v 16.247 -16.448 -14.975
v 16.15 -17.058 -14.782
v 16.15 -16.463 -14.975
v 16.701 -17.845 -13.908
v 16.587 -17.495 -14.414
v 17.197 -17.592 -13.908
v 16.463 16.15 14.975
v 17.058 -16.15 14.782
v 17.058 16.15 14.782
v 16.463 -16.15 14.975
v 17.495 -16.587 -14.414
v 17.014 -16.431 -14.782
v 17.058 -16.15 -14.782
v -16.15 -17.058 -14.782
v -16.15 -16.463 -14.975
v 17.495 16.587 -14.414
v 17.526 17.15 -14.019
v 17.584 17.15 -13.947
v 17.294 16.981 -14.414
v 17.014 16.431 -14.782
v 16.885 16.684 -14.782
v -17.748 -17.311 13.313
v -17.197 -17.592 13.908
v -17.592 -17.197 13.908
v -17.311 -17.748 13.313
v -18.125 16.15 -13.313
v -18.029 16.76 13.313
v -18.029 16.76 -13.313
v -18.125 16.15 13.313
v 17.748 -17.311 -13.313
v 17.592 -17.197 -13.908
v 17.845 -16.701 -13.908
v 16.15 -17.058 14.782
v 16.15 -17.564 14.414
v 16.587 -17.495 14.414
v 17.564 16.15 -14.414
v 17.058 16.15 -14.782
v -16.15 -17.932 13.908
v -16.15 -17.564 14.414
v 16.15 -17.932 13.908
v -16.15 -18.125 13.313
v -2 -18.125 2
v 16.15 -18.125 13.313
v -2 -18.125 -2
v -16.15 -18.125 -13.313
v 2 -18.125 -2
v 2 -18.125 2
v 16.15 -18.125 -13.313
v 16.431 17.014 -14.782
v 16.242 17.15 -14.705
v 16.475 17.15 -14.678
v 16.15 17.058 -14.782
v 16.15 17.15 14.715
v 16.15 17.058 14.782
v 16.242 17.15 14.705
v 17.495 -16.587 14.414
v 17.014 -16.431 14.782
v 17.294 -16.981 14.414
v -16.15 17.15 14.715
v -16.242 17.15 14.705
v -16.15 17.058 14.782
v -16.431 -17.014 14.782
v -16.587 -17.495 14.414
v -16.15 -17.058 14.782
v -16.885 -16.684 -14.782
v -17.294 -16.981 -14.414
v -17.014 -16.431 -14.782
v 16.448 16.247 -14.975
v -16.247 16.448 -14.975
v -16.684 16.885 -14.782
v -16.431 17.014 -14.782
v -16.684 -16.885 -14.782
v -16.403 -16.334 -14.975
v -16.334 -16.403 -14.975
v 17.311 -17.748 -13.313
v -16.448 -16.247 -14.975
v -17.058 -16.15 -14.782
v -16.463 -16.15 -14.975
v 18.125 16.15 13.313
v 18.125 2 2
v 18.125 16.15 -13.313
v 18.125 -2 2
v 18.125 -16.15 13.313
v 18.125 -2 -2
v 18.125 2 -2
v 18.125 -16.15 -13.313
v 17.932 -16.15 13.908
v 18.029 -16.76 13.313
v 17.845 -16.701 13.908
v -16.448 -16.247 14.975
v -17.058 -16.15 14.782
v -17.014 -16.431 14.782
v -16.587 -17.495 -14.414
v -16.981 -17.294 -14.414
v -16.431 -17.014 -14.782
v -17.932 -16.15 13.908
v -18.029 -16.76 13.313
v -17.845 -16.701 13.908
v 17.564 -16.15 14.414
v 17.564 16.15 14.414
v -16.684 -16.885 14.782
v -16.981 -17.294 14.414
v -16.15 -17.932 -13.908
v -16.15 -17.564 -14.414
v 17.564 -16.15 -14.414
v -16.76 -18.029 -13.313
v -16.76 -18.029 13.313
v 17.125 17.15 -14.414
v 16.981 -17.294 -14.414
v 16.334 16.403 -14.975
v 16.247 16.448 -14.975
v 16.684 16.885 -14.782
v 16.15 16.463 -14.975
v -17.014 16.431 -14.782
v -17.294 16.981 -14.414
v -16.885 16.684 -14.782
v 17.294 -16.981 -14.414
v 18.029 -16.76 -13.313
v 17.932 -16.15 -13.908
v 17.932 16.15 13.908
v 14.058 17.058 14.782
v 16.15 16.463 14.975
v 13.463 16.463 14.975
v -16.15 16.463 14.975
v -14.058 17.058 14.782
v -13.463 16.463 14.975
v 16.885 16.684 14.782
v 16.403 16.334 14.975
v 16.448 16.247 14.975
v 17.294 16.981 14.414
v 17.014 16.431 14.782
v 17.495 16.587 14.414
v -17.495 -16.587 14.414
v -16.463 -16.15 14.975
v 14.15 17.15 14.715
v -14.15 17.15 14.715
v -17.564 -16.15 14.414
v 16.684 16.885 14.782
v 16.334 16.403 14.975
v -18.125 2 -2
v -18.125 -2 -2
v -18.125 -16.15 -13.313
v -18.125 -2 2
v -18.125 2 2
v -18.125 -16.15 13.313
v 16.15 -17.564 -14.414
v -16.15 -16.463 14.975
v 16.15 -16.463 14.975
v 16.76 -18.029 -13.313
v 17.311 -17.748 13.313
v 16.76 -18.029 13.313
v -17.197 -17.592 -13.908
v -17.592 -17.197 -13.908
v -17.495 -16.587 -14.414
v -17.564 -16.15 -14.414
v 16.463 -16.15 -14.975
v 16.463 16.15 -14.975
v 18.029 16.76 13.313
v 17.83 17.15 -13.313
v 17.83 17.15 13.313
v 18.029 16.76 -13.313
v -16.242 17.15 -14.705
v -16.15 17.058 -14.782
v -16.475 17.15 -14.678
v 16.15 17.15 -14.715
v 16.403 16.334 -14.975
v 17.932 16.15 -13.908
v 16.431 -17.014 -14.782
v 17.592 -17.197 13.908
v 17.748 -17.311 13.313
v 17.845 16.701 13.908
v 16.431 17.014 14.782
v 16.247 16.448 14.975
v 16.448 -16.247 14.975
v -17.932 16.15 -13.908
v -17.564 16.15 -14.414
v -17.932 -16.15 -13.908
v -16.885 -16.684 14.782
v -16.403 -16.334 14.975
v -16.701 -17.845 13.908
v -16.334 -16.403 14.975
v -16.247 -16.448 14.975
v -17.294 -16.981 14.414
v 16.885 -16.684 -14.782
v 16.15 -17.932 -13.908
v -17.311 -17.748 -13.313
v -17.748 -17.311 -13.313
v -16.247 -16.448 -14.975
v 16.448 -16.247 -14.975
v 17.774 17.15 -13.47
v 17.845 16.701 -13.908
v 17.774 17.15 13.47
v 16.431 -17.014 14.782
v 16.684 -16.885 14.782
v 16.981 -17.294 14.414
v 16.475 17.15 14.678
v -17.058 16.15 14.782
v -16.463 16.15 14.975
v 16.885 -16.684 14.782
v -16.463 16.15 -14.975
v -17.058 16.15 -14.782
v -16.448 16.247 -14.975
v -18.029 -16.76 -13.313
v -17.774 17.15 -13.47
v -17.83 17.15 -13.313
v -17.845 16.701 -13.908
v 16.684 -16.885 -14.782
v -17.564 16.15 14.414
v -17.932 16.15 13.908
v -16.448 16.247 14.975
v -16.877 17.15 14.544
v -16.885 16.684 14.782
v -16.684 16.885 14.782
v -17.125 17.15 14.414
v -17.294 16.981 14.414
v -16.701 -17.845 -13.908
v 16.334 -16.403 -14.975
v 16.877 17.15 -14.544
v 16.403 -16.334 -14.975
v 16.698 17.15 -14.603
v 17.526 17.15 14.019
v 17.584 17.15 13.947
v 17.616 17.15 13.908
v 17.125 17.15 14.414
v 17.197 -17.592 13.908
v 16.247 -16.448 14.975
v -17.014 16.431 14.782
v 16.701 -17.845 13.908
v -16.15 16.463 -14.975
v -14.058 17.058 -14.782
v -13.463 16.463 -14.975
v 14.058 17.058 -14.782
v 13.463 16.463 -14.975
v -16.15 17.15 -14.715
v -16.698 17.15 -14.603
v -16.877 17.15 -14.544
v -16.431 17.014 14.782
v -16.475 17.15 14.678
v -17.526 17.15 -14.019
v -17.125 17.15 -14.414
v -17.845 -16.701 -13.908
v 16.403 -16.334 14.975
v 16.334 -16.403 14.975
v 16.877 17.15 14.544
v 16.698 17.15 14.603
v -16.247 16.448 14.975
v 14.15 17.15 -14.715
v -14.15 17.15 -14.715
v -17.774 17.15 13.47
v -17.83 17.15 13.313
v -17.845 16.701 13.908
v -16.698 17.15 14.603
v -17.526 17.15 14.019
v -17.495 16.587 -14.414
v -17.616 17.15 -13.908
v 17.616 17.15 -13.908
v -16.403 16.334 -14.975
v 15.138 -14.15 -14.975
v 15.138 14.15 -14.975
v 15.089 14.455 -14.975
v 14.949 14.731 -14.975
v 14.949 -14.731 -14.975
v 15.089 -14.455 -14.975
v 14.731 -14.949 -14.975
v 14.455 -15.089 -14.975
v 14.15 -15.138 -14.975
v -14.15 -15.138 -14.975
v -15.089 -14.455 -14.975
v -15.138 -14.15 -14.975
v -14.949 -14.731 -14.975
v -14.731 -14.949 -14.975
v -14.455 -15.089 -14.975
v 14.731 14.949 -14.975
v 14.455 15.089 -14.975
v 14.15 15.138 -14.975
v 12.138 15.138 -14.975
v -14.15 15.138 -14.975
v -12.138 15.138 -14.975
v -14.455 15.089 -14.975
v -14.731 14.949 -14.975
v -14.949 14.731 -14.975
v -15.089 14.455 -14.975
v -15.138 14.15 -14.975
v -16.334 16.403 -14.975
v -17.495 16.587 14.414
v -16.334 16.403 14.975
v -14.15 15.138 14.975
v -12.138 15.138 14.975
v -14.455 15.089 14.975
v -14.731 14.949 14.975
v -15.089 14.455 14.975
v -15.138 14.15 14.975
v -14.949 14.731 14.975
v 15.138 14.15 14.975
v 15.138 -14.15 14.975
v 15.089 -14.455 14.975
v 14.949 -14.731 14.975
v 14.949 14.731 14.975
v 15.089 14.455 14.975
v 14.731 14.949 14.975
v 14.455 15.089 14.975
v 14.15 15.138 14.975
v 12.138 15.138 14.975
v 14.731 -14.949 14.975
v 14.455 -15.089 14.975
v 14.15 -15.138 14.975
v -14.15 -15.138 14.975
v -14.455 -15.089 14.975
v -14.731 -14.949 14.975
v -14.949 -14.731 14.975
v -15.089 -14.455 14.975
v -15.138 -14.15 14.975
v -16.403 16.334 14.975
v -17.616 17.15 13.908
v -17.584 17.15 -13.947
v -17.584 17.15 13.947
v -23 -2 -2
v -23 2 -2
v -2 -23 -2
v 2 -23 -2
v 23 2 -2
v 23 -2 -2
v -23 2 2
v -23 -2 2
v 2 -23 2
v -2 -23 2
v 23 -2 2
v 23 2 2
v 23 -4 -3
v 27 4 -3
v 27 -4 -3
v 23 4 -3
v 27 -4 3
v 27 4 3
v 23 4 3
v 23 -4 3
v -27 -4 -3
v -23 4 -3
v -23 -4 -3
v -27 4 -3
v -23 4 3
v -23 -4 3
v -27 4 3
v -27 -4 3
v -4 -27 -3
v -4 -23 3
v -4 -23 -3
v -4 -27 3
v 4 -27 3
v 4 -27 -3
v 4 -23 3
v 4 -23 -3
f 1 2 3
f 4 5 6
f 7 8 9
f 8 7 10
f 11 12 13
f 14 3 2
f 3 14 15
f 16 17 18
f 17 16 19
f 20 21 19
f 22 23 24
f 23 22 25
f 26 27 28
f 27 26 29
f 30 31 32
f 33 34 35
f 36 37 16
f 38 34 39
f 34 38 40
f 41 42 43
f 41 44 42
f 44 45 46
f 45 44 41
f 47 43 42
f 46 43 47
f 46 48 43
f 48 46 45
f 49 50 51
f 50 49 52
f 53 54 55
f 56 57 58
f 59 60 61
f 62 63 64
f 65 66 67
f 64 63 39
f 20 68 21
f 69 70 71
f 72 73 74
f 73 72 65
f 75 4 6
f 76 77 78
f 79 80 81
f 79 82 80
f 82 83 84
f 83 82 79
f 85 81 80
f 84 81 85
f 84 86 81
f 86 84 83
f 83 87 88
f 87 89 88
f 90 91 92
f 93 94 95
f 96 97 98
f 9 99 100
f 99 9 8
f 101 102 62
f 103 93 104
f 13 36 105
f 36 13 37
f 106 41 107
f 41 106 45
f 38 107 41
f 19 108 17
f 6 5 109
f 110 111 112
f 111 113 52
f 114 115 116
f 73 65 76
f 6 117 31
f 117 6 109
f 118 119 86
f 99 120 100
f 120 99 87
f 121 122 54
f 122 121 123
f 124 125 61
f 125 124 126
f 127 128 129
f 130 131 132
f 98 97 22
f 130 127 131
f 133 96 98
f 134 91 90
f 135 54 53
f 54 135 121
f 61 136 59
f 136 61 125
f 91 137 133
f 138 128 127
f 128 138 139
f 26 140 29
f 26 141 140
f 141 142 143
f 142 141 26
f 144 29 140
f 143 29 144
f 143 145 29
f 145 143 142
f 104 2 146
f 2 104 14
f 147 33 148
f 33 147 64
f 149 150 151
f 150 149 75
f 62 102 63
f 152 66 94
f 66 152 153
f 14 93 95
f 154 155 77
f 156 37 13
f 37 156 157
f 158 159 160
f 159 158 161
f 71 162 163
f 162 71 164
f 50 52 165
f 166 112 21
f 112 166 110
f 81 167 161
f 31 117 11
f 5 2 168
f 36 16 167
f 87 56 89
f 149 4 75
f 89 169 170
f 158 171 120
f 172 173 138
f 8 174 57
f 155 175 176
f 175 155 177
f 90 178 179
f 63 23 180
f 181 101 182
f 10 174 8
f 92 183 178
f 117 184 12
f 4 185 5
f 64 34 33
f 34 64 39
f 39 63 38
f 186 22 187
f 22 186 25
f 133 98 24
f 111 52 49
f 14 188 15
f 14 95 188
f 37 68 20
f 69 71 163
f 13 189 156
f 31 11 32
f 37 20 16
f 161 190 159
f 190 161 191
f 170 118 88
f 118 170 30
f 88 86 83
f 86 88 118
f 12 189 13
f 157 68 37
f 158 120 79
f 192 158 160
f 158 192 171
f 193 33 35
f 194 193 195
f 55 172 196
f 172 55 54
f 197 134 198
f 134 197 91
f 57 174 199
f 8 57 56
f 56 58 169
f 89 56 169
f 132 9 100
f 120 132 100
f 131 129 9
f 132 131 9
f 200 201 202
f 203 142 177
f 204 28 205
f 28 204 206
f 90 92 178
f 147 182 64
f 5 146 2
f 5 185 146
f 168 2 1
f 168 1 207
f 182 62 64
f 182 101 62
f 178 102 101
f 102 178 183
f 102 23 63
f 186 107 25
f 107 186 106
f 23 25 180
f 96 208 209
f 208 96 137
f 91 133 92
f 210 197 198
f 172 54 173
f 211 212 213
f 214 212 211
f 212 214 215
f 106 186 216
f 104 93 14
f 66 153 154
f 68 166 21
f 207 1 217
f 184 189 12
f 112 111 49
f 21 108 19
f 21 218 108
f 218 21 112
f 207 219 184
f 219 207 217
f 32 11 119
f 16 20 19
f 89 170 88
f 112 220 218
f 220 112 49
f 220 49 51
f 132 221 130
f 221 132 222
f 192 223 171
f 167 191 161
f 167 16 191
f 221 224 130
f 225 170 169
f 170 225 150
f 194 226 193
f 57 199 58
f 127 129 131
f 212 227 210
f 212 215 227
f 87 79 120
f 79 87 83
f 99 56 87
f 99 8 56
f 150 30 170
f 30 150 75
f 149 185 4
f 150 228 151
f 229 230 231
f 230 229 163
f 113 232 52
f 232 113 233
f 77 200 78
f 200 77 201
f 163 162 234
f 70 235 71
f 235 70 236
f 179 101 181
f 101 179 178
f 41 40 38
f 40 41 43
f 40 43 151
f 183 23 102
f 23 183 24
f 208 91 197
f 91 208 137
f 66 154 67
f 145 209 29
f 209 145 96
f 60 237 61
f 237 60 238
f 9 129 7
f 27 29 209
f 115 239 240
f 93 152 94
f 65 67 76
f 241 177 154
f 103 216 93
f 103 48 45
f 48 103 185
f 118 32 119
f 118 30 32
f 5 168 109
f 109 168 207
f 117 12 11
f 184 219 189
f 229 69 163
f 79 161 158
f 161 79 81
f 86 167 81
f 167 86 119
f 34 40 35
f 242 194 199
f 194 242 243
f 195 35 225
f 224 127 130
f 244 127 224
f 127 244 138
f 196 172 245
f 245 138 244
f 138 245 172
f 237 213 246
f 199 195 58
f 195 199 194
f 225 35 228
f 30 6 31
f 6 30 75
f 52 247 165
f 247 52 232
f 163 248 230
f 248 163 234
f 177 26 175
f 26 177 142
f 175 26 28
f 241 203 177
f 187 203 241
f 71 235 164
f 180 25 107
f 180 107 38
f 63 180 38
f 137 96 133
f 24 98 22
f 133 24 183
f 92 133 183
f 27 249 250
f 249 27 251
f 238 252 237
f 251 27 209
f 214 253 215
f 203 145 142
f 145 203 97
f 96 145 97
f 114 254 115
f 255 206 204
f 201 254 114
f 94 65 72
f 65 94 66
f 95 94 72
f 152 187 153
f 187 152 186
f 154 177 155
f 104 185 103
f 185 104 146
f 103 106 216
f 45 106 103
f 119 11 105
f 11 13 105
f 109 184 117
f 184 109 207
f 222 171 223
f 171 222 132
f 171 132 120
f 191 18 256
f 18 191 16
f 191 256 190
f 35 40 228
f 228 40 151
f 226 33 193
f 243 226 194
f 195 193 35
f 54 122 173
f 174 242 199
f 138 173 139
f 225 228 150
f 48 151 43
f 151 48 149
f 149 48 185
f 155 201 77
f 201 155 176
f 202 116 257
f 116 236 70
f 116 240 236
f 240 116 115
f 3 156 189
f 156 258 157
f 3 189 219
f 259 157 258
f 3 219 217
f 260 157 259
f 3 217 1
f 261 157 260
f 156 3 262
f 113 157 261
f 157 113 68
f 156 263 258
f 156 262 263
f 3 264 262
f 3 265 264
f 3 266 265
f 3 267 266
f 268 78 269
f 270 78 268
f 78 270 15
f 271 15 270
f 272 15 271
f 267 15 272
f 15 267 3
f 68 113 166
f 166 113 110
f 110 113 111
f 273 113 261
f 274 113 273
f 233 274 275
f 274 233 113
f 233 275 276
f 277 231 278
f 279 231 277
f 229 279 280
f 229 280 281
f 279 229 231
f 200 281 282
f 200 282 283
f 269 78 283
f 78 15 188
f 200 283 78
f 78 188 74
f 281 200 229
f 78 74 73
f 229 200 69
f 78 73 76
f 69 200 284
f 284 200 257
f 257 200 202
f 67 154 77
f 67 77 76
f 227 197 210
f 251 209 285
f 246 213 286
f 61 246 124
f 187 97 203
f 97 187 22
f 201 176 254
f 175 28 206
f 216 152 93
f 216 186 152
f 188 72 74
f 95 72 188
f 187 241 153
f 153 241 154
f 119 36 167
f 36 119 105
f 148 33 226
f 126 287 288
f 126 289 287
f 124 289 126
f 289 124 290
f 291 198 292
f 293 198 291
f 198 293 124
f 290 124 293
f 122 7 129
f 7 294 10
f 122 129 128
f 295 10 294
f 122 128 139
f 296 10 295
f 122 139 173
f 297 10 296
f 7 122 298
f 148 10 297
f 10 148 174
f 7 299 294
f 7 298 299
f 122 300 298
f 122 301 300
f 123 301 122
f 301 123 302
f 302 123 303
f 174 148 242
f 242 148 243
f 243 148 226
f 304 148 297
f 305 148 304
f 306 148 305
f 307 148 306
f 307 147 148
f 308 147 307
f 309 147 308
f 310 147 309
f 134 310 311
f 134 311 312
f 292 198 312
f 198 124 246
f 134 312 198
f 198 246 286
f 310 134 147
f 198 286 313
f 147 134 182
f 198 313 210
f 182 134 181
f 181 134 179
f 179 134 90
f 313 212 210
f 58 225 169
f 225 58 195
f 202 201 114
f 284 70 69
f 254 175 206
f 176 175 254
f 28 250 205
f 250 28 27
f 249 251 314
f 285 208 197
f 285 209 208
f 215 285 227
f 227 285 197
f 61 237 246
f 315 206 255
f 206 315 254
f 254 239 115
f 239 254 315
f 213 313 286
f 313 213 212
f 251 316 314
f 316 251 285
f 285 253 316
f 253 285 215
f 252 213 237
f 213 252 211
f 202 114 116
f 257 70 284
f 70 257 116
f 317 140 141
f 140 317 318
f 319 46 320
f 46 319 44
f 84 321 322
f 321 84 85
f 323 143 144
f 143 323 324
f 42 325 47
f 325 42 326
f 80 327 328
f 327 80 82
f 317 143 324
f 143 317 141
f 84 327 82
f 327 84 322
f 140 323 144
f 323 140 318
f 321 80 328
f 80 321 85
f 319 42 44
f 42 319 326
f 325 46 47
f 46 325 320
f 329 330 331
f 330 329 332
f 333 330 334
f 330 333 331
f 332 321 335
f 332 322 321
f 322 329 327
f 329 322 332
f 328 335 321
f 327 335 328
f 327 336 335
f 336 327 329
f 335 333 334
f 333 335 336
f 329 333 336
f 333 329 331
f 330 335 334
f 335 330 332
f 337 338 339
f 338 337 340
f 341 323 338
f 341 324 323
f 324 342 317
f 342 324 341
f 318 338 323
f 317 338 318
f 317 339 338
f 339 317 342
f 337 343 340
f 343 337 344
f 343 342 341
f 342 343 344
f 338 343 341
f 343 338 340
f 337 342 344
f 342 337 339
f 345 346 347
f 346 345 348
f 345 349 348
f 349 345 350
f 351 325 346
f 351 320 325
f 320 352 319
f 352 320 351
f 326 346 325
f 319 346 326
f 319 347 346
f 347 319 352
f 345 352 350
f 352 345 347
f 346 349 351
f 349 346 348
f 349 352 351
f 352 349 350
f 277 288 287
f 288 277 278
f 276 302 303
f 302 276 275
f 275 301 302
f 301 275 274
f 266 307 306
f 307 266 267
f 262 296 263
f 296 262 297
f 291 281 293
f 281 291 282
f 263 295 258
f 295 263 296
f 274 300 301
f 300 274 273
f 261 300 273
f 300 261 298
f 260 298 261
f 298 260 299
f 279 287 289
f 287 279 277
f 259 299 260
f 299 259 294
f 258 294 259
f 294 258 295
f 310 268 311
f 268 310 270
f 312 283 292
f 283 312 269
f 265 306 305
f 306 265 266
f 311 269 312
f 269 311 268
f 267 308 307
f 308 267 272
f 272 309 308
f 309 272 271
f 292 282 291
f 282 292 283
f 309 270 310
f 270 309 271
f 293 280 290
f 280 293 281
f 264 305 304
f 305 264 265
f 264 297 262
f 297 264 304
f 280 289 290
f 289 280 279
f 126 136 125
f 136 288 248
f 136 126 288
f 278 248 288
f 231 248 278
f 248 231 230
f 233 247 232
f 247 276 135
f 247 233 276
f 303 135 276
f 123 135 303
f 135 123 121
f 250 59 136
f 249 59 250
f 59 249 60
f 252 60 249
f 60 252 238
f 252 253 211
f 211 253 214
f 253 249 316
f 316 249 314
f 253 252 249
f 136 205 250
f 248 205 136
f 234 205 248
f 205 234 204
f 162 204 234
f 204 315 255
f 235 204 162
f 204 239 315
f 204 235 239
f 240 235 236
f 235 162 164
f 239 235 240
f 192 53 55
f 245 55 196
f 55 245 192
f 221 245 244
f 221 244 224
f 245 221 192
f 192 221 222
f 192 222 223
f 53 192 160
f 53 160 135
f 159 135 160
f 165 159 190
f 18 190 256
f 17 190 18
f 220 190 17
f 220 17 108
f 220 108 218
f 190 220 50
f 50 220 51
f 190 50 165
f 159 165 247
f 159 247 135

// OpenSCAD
//=============================================================================
// snap-test.scad
//
// Single piece snap-on attachment to 20mm t-rail.
//=============================================================================
// Written in 2017 by Patrick Barrett
//
// To the extent possible under law, the author(s) have dedicated all copyright
// and related and neighboring rights to this work to the public domain
// worldwide. This work is distributed without any warranty.
//
// See <http://creativecommons.org/publicdomain/zero/1.0/> for full dedication.
//=============================================================================

// rail dimensions
railwidth = 30.3;
raildepth = 30.3;
railcornerradius = 1;

slideclearance = 2;

cliplength = 30;

wall = 3;
bodycornerradius = 2;

// customizable variables end here

abit = 0.001; //use for making overlap to get single manifold stl
alot = 150;

$fn = 20;

difference() {
    union() {
        // main body (rounded rect)
        minkowski() {
            cube([railwidth+wall*2-2*bodycornerradius, raildepth+wall*2-2*bodycornerradius, cliplength-2*bodycornerradius], center=true);
            sphere(r=bodycornerradius);
        }
        
        // handles/hooks/something
        rotate([0,90,0])
        cube([4,4,50], center=true);
        translate([0,0,0])
        rotate([90,0,0])
        cube([4,4,50], center=true);
        
        translate([25,0,0])
        rotate([0,90,0])
        cube([6,8,4], center=true);
        
        translate([-25,0,0])
        rotate([0,90,0])
        cube([6,8,4], center=true);
        
        translate([0,-25,0])
        rotate([90,0,0])
        cube([8,6,4], center=true);
    }
    
    minkowski() {
        cube([railwidth-2*railcornerradius, raildepth-2*railcornerradius, alot], center=true);
        sphere(r=railcornerradius);
    }
    
    // trim open side, leave tabs to lock on
    translate([0,3,-alot/2])
    rotate([0,0,45])
    cube([railwidth, railwidth, alot]);
    
    // ensure tabs won't hit arm slide
    translate([0,alot/2 + raildepth/2 + slideclearance,0])
    cube(alot, center=true);
    
}
